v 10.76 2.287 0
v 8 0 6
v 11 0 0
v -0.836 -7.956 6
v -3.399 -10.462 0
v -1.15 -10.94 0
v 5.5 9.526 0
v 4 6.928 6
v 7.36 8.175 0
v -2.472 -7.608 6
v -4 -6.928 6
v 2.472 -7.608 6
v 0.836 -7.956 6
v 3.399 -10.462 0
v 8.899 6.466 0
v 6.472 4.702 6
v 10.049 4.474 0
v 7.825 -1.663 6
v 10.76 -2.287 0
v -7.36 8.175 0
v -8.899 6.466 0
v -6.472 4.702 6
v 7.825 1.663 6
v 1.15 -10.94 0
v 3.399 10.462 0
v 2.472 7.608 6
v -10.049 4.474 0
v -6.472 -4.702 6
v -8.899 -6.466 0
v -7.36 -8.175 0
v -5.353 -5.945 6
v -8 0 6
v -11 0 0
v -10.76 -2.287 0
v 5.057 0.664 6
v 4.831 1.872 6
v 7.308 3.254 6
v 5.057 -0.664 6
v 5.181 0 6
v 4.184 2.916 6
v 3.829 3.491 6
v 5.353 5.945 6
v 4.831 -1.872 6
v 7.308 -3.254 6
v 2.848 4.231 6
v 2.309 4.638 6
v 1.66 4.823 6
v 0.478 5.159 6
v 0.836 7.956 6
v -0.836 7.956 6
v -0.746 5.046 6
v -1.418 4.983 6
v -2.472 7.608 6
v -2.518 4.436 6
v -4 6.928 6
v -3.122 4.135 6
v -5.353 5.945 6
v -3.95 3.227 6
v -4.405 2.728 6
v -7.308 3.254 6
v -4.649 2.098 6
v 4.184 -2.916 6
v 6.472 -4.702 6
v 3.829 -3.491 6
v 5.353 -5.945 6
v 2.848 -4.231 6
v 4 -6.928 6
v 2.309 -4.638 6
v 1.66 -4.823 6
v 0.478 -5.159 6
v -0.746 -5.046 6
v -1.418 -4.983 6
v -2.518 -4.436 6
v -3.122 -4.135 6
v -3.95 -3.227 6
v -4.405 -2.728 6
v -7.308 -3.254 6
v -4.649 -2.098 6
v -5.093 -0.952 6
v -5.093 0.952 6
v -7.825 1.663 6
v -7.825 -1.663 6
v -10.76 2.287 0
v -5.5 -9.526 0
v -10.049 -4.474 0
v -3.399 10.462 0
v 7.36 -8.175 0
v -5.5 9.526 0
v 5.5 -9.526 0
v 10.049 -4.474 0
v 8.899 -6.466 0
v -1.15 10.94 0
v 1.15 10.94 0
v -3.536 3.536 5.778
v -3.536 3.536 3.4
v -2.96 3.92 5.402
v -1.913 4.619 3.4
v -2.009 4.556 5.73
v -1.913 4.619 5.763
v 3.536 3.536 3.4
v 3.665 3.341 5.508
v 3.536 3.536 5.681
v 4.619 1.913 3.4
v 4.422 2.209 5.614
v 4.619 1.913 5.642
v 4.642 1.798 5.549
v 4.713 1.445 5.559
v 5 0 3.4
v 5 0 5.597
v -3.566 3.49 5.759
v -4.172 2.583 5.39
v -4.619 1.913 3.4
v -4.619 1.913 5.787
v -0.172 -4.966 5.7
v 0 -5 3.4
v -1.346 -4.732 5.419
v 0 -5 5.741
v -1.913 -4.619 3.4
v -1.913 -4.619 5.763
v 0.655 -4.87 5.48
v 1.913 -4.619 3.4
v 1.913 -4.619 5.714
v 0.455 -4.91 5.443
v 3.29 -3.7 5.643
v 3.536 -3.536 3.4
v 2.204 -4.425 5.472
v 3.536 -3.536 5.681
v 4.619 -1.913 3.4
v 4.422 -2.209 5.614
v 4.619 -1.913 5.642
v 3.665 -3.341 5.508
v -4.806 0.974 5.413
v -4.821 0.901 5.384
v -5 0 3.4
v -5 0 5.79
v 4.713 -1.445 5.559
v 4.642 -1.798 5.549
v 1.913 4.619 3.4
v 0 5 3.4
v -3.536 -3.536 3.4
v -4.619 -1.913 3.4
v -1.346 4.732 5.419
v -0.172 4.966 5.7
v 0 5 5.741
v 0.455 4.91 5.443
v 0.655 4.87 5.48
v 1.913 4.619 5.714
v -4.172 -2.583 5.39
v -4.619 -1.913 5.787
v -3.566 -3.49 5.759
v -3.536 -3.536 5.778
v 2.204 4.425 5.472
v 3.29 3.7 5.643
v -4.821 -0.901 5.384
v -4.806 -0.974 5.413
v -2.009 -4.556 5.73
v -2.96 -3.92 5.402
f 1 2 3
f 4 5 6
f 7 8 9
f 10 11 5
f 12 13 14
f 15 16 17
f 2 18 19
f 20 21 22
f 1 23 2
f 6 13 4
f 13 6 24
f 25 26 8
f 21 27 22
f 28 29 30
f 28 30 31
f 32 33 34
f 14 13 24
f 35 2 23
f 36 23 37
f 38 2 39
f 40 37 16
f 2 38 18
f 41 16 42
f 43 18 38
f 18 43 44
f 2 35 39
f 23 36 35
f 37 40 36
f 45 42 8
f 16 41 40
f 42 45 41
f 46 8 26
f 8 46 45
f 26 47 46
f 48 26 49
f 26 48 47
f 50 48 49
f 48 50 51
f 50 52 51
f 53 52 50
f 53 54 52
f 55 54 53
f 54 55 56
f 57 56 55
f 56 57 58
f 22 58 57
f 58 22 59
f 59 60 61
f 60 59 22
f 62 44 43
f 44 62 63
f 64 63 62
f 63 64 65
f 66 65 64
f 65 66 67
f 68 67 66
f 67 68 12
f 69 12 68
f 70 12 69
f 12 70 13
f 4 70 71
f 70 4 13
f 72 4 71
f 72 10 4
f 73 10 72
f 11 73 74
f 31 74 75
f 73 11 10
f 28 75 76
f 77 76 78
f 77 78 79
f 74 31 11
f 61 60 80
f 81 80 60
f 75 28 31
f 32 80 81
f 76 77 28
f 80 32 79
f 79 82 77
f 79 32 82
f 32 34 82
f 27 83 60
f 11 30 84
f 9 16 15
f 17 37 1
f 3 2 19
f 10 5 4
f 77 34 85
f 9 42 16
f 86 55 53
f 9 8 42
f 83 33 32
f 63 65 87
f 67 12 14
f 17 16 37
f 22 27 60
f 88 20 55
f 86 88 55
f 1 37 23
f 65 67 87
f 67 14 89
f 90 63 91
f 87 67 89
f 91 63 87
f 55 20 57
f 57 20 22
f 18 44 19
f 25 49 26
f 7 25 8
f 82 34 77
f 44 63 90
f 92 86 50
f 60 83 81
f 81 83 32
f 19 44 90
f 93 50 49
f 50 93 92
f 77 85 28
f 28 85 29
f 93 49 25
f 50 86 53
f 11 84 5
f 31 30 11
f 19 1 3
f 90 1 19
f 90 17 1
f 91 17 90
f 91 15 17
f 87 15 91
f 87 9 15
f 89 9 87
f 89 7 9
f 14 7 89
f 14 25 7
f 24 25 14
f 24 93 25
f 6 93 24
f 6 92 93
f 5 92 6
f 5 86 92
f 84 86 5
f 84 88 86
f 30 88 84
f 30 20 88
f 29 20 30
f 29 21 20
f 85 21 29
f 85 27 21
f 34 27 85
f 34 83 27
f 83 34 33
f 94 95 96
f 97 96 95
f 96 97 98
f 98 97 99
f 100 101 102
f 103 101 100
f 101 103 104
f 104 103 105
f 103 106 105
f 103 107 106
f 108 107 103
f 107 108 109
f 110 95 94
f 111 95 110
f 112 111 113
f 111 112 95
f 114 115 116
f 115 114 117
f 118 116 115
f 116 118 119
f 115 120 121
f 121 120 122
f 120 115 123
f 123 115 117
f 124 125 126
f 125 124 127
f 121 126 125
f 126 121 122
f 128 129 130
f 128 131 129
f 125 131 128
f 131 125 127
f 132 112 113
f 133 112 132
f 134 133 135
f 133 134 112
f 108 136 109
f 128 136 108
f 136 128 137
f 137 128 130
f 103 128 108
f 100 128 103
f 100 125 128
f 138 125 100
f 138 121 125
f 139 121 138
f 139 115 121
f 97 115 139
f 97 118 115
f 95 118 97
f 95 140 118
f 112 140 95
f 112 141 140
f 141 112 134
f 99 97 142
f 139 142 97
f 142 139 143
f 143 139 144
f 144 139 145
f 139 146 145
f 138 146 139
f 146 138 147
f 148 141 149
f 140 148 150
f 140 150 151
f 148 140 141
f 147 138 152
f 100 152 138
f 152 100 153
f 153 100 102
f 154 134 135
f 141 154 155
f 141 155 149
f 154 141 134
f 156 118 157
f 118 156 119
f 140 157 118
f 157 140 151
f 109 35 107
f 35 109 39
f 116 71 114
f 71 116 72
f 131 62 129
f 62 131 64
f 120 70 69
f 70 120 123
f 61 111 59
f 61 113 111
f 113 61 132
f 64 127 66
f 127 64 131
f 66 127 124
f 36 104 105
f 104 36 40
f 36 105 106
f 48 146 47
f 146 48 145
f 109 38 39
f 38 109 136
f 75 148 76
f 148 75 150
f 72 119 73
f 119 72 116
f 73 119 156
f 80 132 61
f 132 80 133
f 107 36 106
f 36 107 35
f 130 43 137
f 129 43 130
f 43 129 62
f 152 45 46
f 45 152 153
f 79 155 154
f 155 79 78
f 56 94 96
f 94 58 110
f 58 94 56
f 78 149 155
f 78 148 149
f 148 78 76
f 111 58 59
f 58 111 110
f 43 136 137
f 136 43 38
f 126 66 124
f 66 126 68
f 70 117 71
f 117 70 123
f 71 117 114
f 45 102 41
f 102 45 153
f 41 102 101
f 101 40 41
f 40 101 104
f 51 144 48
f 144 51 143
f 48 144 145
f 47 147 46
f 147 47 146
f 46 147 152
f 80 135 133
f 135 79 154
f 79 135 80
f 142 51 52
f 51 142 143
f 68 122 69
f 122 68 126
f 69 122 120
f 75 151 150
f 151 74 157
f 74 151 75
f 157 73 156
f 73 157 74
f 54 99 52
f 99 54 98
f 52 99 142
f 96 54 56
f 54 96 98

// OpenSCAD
// Refrigerator Magnet.  
// Uses a neodymium disk magnet.
// Tapered 60 degrees towards magnetic side so it's easy to remove.
//
// Magnet socket is a hair deeper to allow for a drop of glue
//
//  Mooselake 21 Mar 2013
//

// Magnet Diameter
Dmagnet = 10.0;

// Magnet Thickness
Hmagnet = 2.5;

// Top Diameter of holder (out side)
Dtop = 22;

// Bottom Diameter of holder (Refrigerator side), must be bigger than magnet.
Dbot = 16;


// Thickness of holder
Hholder = 6;


Rmagnet = Dmagnet/2;
Rbot    = Dbot/2;
Rtop    = Dtop/2;

// print upside down, magnet cutout on top

difference() {
	cylinder(h = Hholder, r1 = Rtop, r2 = Rbot);		// holder
	translate([0,0,Hholder-Hmagnet-0.1])
		cylinder(h=Hmagnet+0.1, r=Rmagnet);			// magnet hole
	translate([0,0,Hholder-(Hmagnet*0.25)])
		cylinder(h=1, r1=Rmagnet*0.98, r2=Rmagnet*1.07);  // chamfered for easy insertion
	}
